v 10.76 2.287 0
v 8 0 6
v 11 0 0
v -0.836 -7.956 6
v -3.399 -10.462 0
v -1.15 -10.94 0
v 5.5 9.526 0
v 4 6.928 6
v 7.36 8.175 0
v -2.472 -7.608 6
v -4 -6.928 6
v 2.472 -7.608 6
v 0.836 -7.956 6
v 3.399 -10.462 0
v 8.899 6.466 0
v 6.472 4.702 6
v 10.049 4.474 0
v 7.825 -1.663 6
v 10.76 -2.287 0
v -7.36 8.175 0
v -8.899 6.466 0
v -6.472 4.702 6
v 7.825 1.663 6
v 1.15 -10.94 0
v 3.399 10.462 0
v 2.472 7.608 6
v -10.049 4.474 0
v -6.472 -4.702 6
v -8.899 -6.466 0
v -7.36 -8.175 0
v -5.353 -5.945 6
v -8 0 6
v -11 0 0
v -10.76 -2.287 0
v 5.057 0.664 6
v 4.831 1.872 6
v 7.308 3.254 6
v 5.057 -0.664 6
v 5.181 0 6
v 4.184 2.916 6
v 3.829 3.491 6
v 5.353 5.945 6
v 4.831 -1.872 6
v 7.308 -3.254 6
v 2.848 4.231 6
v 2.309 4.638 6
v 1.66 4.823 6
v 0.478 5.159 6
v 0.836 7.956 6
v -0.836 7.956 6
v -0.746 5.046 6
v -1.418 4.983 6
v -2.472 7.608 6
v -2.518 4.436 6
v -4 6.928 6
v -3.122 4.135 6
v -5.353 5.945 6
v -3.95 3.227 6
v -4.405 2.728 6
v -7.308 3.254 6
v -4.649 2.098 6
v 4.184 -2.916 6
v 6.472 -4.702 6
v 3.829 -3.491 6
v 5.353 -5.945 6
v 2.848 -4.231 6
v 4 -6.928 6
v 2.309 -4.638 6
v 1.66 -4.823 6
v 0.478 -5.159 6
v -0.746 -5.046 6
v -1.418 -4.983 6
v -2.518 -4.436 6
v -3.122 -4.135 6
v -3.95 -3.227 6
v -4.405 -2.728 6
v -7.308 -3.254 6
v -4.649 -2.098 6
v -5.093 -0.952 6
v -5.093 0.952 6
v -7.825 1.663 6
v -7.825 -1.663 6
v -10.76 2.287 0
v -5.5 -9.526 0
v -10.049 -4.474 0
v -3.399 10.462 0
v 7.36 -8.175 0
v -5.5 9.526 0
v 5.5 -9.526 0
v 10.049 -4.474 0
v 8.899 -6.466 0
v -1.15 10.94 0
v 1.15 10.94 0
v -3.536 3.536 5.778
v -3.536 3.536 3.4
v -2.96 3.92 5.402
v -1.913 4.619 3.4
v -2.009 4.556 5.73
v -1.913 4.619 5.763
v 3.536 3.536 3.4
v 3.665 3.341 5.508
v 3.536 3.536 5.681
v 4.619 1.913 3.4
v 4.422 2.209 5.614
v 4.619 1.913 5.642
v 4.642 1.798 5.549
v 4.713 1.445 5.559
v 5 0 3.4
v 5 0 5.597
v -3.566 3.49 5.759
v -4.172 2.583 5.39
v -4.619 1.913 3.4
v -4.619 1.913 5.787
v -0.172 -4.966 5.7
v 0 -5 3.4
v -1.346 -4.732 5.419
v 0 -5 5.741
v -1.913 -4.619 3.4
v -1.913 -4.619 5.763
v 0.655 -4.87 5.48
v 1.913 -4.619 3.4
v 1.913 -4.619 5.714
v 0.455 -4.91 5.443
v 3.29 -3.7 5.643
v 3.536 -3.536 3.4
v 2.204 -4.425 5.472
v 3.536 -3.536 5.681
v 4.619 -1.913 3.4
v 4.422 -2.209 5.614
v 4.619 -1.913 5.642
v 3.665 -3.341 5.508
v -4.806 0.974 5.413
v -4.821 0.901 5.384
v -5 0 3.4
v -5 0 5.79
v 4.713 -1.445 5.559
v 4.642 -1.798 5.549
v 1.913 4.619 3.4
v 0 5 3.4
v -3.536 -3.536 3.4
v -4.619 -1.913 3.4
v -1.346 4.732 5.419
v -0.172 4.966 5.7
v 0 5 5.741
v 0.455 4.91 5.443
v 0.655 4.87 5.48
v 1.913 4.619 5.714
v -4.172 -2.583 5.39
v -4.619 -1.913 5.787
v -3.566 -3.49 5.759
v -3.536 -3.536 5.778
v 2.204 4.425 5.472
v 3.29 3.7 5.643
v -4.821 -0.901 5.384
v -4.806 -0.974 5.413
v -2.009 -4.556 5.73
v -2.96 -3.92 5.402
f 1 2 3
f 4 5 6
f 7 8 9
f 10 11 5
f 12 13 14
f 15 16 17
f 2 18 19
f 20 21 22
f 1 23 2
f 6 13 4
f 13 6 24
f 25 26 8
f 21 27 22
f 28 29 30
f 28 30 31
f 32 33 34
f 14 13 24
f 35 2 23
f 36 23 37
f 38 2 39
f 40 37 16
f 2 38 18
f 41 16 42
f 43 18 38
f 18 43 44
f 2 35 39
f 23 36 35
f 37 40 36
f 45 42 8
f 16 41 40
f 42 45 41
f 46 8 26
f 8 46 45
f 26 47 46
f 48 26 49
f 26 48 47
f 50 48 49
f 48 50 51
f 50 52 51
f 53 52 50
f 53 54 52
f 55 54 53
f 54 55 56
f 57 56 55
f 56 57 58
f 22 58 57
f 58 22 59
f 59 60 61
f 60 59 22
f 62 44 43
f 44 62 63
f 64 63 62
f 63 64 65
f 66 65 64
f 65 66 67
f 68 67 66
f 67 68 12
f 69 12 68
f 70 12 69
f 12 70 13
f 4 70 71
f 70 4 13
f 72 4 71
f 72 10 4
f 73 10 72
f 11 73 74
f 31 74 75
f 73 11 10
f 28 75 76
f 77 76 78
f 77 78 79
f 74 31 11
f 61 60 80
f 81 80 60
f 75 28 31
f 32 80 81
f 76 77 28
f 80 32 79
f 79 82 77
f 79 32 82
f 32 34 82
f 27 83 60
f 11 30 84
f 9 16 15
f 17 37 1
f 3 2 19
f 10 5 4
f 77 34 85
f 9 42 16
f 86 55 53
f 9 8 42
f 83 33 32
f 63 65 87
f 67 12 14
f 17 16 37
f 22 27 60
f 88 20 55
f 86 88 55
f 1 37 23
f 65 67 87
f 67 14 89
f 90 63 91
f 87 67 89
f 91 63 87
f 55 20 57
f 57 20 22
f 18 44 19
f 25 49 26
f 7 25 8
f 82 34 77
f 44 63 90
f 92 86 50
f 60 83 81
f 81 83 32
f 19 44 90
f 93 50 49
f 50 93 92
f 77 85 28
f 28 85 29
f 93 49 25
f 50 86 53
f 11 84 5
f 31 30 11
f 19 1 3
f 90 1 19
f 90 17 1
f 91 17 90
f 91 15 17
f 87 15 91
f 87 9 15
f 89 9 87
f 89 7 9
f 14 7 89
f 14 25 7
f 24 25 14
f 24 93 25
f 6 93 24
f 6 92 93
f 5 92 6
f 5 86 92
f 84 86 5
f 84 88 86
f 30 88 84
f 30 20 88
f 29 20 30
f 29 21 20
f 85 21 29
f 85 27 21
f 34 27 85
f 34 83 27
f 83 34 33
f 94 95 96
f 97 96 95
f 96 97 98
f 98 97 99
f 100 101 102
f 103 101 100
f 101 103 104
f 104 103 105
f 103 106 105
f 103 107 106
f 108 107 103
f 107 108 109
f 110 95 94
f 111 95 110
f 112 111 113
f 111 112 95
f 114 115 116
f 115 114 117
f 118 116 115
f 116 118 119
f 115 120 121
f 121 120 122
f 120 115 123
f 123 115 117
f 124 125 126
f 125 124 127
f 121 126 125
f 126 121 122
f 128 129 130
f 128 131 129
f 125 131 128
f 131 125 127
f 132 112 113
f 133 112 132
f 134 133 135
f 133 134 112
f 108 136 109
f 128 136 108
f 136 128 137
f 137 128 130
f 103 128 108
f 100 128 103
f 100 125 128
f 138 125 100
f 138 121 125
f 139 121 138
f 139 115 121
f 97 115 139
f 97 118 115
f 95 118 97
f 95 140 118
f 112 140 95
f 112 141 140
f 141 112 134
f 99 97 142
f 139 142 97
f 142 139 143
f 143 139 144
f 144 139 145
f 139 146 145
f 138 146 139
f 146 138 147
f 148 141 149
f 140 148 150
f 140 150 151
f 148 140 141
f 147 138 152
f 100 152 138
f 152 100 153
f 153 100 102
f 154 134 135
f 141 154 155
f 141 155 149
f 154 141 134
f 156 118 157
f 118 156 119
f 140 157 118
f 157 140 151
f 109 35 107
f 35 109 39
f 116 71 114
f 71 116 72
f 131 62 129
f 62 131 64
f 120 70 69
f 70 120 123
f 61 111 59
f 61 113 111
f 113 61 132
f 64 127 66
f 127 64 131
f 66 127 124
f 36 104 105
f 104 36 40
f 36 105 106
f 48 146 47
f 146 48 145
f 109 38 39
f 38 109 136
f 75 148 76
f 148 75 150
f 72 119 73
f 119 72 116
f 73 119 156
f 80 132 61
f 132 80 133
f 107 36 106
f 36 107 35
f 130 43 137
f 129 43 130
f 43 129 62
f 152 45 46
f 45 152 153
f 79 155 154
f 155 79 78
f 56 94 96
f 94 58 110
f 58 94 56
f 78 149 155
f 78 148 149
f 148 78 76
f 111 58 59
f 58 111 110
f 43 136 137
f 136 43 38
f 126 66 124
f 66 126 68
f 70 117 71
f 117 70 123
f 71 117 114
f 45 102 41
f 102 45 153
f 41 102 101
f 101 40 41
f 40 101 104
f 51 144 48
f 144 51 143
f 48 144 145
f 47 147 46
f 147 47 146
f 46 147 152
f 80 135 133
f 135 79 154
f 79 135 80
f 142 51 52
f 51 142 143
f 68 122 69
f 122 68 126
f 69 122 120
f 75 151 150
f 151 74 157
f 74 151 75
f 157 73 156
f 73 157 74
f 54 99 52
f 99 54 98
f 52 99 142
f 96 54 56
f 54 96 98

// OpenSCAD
// Refrigerator Magnet.  
// Uses a neodymium disk magnet.
// Tapered 60 degrees towards magnetic side so it's easy to remove.
//
// Magnet socket is a hair deeper to allow for a drop of glue
//
//  Mooselake 21 Mar 2013
//

// Magnet Diameter
Dmagnet = 10.0;

// Magnet Thickness
Hmagnet = 2.5;

// Top Diameter of holder (out side)
Dtop = 22;

// Bottom Diameter of holder (Refrigerator side), must be bigger than magnet.
Dbot = 16;


// Thickness of holder
Hholder = 6;


Rmagnet = Dmagnet/2;
Rbot    = Dbot/2;
Rtop    = Dtop/2;

// print upside down, magnet cutout on top

difference() {
	cylinder(h = Hholder, r1 = Rtop, r2 = Rbot);		// holder
	translate([0,0,Hholder-Hmagnet-0.1])
		cylinder(h=Hmagnet+0.1, r=Rmagnet);			// magnet hole
	translate([0,0,Hholder-(Hmagnet*0.25)])
		cylinder(h=1, r1=Rmagnet*0.98, r2=Rmagnet*1.07);  // chamfered for easy insertion
	}
